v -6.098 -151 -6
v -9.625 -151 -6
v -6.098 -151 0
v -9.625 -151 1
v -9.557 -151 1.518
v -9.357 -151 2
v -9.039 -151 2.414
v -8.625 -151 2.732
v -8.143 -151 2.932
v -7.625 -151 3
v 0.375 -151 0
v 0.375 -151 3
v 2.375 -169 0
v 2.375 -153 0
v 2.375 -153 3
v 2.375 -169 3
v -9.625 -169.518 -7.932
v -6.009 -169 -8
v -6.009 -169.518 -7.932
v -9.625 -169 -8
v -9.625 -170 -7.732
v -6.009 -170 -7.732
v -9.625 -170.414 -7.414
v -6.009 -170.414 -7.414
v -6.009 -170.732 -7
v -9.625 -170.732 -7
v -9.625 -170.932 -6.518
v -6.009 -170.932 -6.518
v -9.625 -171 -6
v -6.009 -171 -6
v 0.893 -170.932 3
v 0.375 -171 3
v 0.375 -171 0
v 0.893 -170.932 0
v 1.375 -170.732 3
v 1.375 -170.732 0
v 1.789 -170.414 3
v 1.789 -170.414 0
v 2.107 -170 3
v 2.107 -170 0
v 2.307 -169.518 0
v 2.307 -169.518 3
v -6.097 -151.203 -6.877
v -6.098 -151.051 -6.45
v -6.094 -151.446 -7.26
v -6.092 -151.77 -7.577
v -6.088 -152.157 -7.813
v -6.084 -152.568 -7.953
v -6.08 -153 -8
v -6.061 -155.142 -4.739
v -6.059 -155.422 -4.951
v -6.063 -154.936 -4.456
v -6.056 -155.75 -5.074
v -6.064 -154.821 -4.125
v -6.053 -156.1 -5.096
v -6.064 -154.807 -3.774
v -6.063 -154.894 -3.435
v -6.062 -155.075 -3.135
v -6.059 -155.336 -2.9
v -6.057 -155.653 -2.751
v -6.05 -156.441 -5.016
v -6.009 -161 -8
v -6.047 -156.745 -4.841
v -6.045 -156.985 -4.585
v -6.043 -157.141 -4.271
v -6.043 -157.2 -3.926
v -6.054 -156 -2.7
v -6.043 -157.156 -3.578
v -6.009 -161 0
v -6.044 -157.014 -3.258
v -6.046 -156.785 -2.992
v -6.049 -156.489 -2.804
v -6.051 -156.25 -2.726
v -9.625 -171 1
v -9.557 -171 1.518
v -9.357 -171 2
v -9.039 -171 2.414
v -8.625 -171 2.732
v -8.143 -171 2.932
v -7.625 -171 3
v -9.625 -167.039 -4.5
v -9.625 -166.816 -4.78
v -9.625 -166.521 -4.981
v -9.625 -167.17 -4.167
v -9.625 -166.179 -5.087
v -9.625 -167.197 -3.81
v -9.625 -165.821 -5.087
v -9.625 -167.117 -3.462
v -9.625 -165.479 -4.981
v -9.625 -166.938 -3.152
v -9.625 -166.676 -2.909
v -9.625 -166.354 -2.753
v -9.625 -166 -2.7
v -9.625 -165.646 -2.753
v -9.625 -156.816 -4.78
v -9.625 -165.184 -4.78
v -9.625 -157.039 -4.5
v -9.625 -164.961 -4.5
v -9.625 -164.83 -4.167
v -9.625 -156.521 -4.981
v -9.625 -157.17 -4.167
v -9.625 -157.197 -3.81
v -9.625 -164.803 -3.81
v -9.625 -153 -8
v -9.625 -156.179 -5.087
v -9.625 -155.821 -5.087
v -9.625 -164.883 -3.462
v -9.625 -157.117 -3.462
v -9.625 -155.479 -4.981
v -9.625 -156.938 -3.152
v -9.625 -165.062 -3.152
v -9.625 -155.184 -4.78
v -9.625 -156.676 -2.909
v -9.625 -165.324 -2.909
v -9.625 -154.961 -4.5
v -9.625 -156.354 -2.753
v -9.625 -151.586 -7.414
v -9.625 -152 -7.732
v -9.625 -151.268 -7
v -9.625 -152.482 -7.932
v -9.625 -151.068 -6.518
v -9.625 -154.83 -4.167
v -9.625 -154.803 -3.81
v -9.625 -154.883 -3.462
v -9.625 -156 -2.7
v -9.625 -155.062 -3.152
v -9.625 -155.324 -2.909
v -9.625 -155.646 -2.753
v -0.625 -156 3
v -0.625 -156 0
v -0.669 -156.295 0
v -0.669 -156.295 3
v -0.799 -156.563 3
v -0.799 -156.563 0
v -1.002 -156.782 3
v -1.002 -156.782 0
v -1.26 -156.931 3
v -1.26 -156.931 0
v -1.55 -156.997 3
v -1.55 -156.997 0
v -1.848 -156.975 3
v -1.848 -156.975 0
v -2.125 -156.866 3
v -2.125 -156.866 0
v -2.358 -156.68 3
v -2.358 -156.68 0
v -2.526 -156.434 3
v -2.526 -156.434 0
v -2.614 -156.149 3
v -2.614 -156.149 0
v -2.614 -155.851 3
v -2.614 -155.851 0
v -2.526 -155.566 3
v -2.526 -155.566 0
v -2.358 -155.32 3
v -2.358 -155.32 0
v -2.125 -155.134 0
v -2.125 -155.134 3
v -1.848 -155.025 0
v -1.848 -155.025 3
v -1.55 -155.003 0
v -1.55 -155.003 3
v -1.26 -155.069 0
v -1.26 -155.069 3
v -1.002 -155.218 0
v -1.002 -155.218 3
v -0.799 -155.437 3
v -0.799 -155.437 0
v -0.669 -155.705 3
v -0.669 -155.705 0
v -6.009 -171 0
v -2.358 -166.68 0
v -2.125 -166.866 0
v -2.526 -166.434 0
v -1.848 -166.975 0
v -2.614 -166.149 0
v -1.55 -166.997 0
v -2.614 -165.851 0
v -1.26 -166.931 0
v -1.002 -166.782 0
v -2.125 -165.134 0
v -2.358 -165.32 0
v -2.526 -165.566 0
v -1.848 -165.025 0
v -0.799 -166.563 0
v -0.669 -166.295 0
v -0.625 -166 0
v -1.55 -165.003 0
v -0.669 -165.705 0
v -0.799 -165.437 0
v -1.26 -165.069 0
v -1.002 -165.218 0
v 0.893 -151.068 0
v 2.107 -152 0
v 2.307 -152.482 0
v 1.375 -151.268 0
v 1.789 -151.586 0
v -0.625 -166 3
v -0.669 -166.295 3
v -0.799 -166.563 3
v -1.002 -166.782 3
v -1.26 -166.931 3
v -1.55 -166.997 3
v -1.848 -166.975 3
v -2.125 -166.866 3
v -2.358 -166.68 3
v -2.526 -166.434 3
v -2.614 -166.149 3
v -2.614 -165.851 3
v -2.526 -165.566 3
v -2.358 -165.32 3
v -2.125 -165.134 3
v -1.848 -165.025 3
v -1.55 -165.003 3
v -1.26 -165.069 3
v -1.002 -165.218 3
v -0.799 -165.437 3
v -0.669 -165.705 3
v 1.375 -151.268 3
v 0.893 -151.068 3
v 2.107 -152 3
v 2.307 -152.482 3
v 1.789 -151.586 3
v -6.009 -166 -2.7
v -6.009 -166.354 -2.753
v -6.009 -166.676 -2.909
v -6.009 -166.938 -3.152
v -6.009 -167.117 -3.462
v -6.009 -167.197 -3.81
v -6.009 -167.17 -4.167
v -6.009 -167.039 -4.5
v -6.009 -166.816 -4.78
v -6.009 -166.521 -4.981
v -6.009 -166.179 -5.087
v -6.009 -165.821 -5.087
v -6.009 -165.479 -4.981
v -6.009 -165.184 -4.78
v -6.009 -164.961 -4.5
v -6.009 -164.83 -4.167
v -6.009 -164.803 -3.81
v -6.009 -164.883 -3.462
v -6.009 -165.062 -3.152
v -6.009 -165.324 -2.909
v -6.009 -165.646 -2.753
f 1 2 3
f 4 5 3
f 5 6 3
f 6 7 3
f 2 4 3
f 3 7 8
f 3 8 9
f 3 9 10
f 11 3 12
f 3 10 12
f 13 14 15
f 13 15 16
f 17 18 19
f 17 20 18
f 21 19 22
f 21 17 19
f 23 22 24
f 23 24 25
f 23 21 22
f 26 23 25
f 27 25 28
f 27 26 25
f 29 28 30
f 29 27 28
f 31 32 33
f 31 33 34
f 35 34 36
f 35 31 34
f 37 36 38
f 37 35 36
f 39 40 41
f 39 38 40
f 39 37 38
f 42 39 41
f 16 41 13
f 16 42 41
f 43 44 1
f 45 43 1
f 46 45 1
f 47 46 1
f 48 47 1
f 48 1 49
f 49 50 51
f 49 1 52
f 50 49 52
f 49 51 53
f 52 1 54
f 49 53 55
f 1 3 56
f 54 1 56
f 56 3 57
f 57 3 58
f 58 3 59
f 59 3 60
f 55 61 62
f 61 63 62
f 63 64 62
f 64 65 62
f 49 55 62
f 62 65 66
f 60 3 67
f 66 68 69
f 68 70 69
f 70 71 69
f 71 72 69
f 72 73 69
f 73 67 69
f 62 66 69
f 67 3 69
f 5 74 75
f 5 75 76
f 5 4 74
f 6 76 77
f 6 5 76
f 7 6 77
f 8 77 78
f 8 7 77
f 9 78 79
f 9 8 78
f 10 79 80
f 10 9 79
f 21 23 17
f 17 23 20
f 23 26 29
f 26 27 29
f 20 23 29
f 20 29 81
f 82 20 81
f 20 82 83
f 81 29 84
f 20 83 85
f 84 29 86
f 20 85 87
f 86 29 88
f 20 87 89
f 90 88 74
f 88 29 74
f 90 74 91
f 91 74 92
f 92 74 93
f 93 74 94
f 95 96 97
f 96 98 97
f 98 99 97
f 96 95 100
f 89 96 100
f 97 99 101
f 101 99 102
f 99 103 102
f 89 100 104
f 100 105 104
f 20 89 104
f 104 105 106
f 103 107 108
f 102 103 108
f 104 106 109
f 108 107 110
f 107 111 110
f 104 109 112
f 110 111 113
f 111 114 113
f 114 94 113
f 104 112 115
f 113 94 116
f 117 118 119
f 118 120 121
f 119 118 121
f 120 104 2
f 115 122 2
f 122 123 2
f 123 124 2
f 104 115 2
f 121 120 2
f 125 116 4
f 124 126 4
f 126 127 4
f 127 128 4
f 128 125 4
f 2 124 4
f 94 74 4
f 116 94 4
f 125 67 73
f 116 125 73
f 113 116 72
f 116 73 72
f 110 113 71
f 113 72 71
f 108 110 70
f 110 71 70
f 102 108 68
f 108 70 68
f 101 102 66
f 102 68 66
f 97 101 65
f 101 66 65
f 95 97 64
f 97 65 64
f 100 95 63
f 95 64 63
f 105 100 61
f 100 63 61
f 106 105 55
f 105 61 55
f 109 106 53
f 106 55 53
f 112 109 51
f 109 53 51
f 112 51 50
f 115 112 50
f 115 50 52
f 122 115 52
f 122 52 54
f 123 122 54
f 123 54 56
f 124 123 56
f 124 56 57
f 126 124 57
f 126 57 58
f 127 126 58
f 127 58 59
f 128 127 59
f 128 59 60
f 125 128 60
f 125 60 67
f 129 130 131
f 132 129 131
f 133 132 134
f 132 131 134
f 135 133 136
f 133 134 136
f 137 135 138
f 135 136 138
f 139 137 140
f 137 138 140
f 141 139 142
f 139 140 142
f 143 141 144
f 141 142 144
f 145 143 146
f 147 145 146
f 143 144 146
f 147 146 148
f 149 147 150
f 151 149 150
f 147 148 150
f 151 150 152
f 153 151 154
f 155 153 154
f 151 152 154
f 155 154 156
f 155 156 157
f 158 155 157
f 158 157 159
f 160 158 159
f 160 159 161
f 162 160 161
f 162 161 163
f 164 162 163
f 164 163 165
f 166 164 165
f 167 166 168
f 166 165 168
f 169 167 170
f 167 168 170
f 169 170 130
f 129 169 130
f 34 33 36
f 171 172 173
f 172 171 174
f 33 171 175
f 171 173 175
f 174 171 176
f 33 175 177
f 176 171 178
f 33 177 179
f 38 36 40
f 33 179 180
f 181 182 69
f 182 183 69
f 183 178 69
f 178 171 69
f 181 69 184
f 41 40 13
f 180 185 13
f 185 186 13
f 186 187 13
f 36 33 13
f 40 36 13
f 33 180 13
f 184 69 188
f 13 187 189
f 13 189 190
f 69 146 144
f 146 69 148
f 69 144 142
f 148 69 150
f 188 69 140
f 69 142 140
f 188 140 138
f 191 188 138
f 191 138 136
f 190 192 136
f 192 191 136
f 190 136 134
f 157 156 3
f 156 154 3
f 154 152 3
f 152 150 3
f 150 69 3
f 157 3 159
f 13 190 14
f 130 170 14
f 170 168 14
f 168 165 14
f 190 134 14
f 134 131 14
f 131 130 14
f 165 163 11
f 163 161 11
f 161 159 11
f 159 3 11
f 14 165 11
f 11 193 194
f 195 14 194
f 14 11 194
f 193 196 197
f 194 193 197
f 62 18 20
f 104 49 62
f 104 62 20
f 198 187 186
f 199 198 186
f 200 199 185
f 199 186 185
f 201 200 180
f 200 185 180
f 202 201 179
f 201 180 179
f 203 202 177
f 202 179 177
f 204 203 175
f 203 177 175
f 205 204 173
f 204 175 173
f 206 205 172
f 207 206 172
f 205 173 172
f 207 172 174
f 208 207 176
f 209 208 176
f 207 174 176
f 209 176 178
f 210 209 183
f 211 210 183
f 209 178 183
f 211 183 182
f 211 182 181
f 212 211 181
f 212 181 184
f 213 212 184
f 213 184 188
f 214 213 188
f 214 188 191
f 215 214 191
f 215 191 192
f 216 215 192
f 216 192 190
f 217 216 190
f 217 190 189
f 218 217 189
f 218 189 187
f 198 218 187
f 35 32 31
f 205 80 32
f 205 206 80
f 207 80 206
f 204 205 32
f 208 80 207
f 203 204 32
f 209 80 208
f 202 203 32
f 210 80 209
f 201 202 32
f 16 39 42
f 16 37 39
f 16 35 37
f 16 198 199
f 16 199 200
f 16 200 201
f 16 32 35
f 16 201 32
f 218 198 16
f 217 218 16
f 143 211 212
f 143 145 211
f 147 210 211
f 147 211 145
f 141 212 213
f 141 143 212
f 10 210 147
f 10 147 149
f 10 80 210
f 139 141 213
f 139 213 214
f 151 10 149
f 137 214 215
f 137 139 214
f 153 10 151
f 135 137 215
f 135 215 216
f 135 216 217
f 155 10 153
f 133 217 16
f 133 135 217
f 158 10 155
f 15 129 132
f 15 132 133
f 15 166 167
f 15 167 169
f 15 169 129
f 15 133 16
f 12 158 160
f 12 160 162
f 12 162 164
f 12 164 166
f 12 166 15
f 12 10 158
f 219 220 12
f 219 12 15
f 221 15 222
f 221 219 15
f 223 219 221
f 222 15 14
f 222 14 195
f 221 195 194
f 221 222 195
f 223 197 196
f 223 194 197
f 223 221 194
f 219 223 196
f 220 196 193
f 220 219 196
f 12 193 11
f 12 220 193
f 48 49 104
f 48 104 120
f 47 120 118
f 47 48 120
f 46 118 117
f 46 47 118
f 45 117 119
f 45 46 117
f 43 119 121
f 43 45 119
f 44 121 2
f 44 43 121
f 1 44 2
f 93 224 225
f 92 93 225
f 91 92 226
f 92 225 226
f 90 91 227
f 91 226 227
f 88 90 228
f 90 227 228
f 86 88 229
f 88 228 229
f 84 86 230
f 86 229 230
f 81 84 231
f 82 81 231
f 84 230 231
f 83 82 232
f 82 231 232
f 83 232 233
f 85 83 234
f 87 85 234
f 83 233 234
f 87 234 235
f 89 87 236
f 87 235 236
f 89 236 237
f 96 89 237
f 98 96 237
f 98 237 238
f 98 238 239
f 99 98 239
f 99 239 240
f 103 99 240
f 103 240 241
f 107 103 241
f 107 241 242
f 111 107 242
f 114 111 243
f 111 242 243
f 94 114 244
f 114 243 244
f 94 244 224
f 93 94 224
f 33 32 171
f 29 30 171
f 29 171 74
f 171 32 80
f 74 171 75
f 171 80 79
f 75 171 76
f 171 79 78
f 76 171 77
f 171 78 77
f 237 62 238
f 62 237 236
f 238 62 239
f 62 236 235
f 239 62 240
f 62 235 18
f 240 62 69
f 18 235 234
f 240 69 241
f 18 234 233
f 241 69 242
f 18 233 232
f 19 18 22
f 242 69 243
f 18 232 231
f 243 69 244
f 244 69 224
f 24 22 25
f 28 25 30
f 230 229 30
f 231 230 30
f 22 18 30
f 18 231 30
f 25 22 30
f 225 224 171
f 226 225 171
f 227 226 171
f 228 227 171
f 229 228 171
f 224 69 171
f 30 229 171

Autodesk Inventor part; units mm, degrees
ref_plane "YZ Plane" through (0, 0, 0) normal (1, 0, 0) x (0, 1, 0)
ref_plane "XZ Plane" through (0, 0, 0) normal (0, 1, 0) x (-1, 0, 0)
ref_plane "XY Plane" through (0, 0, 0) normal (0, 0, 1) x (1, 0, 0)
ref_plane "Plano de trabajo1" through (0, 0, 0) normal (0, 0, 1) x (1, 0, 0)
sketch "Boceto1" plane through (0, 0, 0) normal (0, 0, 1) x (1, 0, 0)
  circle A0 centre (108.375, -226.9) radius 1.5
  circle A1 centre (108.375, -327.280446) radius 1.5
  line L0 (58.475, -218.4) -> (58.475, -213.4)
  line L1 (58.475, -213.4) -> (80.675, -213.4)
  line L2 (80.675, -213.4) -> (80.675, -218.4)
  line L3 (58.475, -218.4) -> (80.675, -218.4)
  line L4 (99.475, -248.4) -> (104.475, -248.4)
  line L5 (104.475, -248.4) -> (104.475, -268.4)
  line L6 (104.475, -268.4) -> (99.475, -268.4)
  line L7 (99.475, -330.5) -> (99.475, -268.4)
  line L8 (99.475, -330.5) -> (44.375, -330.5)
  line L9 (44.375, -330.5) -> (44.375, -223.4)
  line L10 (99.475, -223.4) -> (44.375, -223.4)
  line L11 (99.475, -248.4) -> (99.475, -223.4)
  line L12 (98.375, -209.4) -> (88.675, -209.4)
  line L13 (88.675, -209.4) -> (88.675, -176)
  line L14 (88.675, -176) -> (197.375, -176)
  line L15 (197.375, -176) -> (197.375, -326)
  line L16 (197.375, -326) -> (112.375, -326)
  line L17 (112.375, -326) -> (112.375, -223.4)
  arc A2 (112.375, -223.4) -> (98.375, -209.4) centre (98.375, -223.4) ccw
  line L18 (29.999359, -209.4) -> (29.999359, -326)
  line L19 (29.999359, -326) -> (20.625, -326)
  line L20 (20.625, -326) -> (20.625, -288)
  line L21 (20.625, -288) -> (9.375, -288)
  line L22 (9.375, -288) -> (9.375, -176)
  line L23 (9.375, -176) -> (20.625, -176)
  line L24 (20.625, -176) -> (20.625, -209.4)
  line L25 (20.625, -209.4) -> (29.999359, -209.4)
  circle A3 centre (69.375, -196) radius 1.6
  circle A4 centre (44.375, -196) radius 1.6
  circle A5 centre (215.275, -317.3) radius 1.5
  circle A6 centre (2.725, -309.3) radius 1.5
  circle A7 centre (2.725, -317.7) radius 1.5
  circle A8 centre (215.275, -311.6) radius 1.5
  line L26 (212.375, -161) -> (-5.625, -161)
  line L27 (-5.625, -161) -> (-5.625, -303)
  line L28 (-5.625, -303) -> (5.625, -303)
  line L29 (5.625, -303) -> (5.625, -306)
  line L30 (5.625, -306) -> (-1.875, -306)
  line L31 (-1.875, -306) -> (-1.875, -321)
  line L32 (-1.875, -321) -> (5.625, -321)
  line L33 (5.625, -321) -> (5.625, -341)
  line L34 (5.625, -341) -> (212.375, -341)
  line L35 (212.375, -341) -> (212.375, -321)
  line L36 (212.375, -321) -> (218.675, -321)
  line L37 (218.675, -321) -> (218.675, -307.9)
  line L38 (218.675, -307.9) -> (212.375, -307.9)
  line L39 (212.375, -307.9) -> (212.375, -161)
  circle A9 centre (143.025, -170) radius 1.5
  circle A10 centre (94.675, -170) radius 1.5
  circle A11 centre (191.375, -170) radius 1.5
  circle A12 centre (33.999359, -226.9) radius 1.5
  circle A13 centre (33.999359, -327.540446) radius 1.5
  circle A14 centre (143.025, -152) radius 1.5
  circle A15 centre (94.675, -152) radius 1.5
  circle A16 centre (191.375, -152) radius 1.5
  line L40 (-5.625, -161) -> (212.375, -161)
  line L41 (212.375, -161) -> (212.375, -14.1)
  line L42 (212.375, -14.1) -> (218.675, -14.1)
  line L43 (218.675, -14.1) -> (218.675, -1)
  line L44 (218.675, -1) -> (212.375, -1)
  line L45 (212.375, -1) -> (212.375, 19)
  line L46 (212.375, 19) -> (5.625, 19)
  line L47 (5.625, 19) -> (5.625, -1)
  line L48 (5.625, -1) -> (-1.875, -1)
  line L49 (-1.875, -1) -> (-1.875, -16)
  line L50 (-1.875, -16) -> (5.625, -16)
  line L51 (5.625, -16) -> (5.625, -19)
  line L52 (5.625, -19) -> (-5.625, -19)
  line L53 (-5.625, -19) -> (-5.625, -161)
  circle A17 centre (215.275, -4.7) radius 1.5
  circle A18 centre (2.725, -12.7) radius 1.5
  circle A19 centre (2.725, -4.3) radius 1.5
  circle A20 centre (215.275, -10.4) radius 1.5
  line L54 (91.875, 14.8) -> (91.875, -3.3)
  line L55 (91.875, -3.3) -> (83.875, -3.3)
  line L56 (83.875, -3.3) -> (83.875, 14.8)
  line L57 (83.875, 14.8) -> (91.875, 14.8)
  line L58 (163.175, 8.8) -> (163.175, 2.3)
  line L59 (163.175, 2.3) -> (156.675, 2.3)
  line L60 (156.675, 2.3) -> (156.675, 8.8)
  line L61 (156.675, 8.8) -> (163.175, 8.8)
  line L62 (145.075, 8.8) -> (145.075, 2.3)
  line L63 (145.075, 2.3) -> (138.575, 2.3)
  line L64 (138.575, 2.3) -> (138.575, 8.8)
  line L65 (138.575, 8.8) -> (145.075, 8.8)
  line L66 (102.375, 2.3) -> (102.375, 8.8)
  line L67 (102.375, 8.8) -> (108.875, 8.8)
  line L68 (108.875, 8.8) -> (108.875, 2.3)
  line L69 (108.875, 2.3) -> (102.375, 2.3)
  line L70 (184.675, 8.8) -> (184.675, 2.3)
  line L71 (184.675, 2.3) -> (178.175, 2.3)
  line L72 (178.175, 2.3) -> (178.175, 8.8)
  line L73 (178.175, 8.8) -> (184.675, 8.8)
  line L74 (126.975, 8.8) -> (126.975, 2.3)
  line L75 (126.975, 2.3) -> (120.475, 2.3)
  line L76 (120.475, 2.3) -> (120.475, 8.8)
  line L77 (120.475, 8.8) -> (126.975, 8.8)
  circle A21 centre (44.375, -126) radius 1.6
  circle A22 centre (69.375, -126) radius 1.6
  line L78 (20.625, -146) -> (9.375, -146)
  line L79 (9.375, -146) -> (9.375, -34)
  line L80 (9.375, -34) -> (20.625, -34)
  line L81 (20.625, -34) -> (20.625, 4)
  line L82 (20.625, 4) -> (49.475, 4)
  line L83 (49.475, 4) -> (49.475, -112.6)
  line L84 (49.475, -112.6) -> (20.625, -112.6)
  line L85 (20.625, -112.6) -> (20.625, -146)
  line L86 (88.675, -146) -> (88.675, -10.3)
  line L87 (88.675, -10.3) -> (197.375, -10.3)
  line L88 (197.375, -10.3) -> (197.375, -146)
  line L89 (197.375, -146) -> (88.675, -146)
  line L90 (220.675, 19) -> (220.675, -161)
  line L91 (-7.625, 19) -> (-7.625, -161)
  line L92 (212.875, -14.6) -> (212.875, -161)
  line L93 (-6.125, -161) -> (-6.125, -18.5)
  line L94 (-7.625, -161) -> (2.375, -161)
  line L95 (2.375, -161) -> (2.375, -171)
  line L96 (2.375, -171) -> (-9.625, -171)
  line L97 (-9.625, -171) -> (-9.625, -151)
  line L98 (-9.625, -151) -> (2.375, -151)
  line L99 (2.375, -151) -> (2.375, -171)
  line L100 (2.375, -151) -> (-1.625, -151)
  line L101 (-1.625, -151) -> (-1.625, -171)
  line L102 (2.375, -151) -> (2.375, -156)
  line L103 (2.375, -156) -> (-1.625, -156)
  line L104 (2.375, -171) -> (2.375, -166)
  line L105 (2.375, -166) -> (-1.625, -166)
  circle A23 centre (-1.625, -156) radius 1
  circle A24 centre (-1.625, -166) radius 1
  line L106 (-7.625, -161) -> (-6.125, -161)
  line L107 (-6.125, -18.5) -> (5.125, -18.5)
  line L108 (5.125, -18.5) -> (5.125, -16.5)
  line L109 (5.125, -16.5) -> (-2.375, -16.5)
  line L110 (-2.375, -16.5) -> (-2.375, -0.5)
  line L111 (-2.375, -0.5) -> (5.125, -0.5)
  line L112 (5.125, -0.5) -> (5.125, 19.5)
  line L113 (5.125, 19.5) -> (212.875, 19.5)
  line L114 (212.875, 19.5) -> (212.875, -0.5)
  line L115 (212.875, -0.5) -> (219.175, -0.5)
  line L116 (219.175, -0.5) -> (219.175, -14.6)
  line L117 (219.175, -14.6) -> (212.875, -14.6)
  line L118 (212.875, -161) -> (220.675, -161)
  arc A25 (220.675, 19) -> (218.675, 21) centre (218.675, 19) ccw
  line L119 (218.675, 21) -> (-5.625, 21)
  arc A26 (-5.625, 21) -> (-7.625, 19) centre (-5.625, 19) ccw
  circle A27 centre (216.675, -156) radius 1.5
  point P0 (0, 0)
  dimension "d0" = 10
  dimension "d1" = 10
  dimension "d2" = 12
  dimension "d3" = 20
  dimension "d4" = 4
  dimension "d5" = 5
  dimension "d6" = 5
  dimension "d7" = 2
  dimension "d8" = 2
extrude "Extrusión1" add sketch "Boceto1" along normal blind 3 contours L95 L105 A24 L101 L26 | L26 L101 A23 L103 L99 | L101 A24 L96 L27 L26 | L26 L53 L98 L101 A23 | L95 L96 L101 A24 L105 | L103 A23 L101 L98 L99 | L94 L93 L98 L53 | L27 L96 L97 L98 L91 L94 | L94 L91 L98 L93
sketch "Boceto2" plane through (0, 0, 0) normal (0, 0, -1) x (-1, 0, 0)
  line L0 (7.625, 19) -> (7.625, -161)
  line L1 (-2.375, -151) -> (9.625, -151)
  line L2 (-2.375, -171) -> (-2.375, -151)
  line L3 (9.625, -171) -> (-2.375, -171)
  line L4 (9.625, -151) -> (9.625, -171)
  circle A0 centre (1.625, -166) radius 1
  circle A1 centre (1.625, -156) radius 1
  line L5 (-14.191374, -161) -> (6.008626, -161)
  line L6 (7.625, 19) -> (7.625, -161)
  arc A2 (7.625, 19) -> (5.625, 21) centre (5.625, 19) ccw
  line L7 (5.625, 21) -> (-218.675, 21)
  arc A3 (-218.675, 21) -> (-220.675, 19) centre (-218.675, 19) ccw
  line L8 (-220.675, 19) -> (-220.675, -161)
  line L9 (-222.291374, -161) -> (-209.991374, -161)
  line L10 (-208.375, -161) -> (-208.375, 9.8)
  line L11 (-208.375, 9.8) -> (-12.575, 9.8)
  line L12 (-12.575, 9.8) -> (-12.575, -161)
  circle A4 centre (-215.275, -4.7) radius 1.2
  circle A5 centre (-2.725, -4.3) radius 1.2
  circle A6 centre (-2.725, -12.7) radius 1.2
  circle A7 centre (-215.275, -10.4) radius 1.2
  line L13 (6.008626, -161) -> (-14.191374, -161)
  line L14 (-14.191374, -161) -> (-14.191374, -337)
  line L15 (-14.191374, -337) -> (-209.991374, -337)
  line L16 (-209.991374, -337) -> (-209.991374, -161)
  line L17 (-209.991374, -161) -> (-222.291374, -161)
  line L18 (-222.291374, -161) -> (-222.291374, -346.2)
  arc A8 (-222.291374, -346.2) -> (-220.291374, -348.2) centre (-220.291374, -346.2) ccw
  line L19 (4.008626, -348.2) -> (-220.291374, -348.2)
  arc A9 (4.008626, -348.2) -> (6.008626, -346.2) centre (4.008626, -346.2) ccw
  line L20 (6.008626, -161) -> (6.008626, -346.2)
  circle A10 centre (-216.891374, -311.6) radius 1.2
  circle A11 centre (-4.341374, -309.3) radius 1.2
  circle A12 centre (-4.341374, -317.7) radius 1.2
  circle A13 centre (-216.891374, -317.3) radius 1.2
  line L21 (-2.375, -151) -> (9.625, -151)
  line L22 (9.625, -151) -> (9.625, -171)
  line L23 (9.625, -171) -> (-2.375, -171)
  line L24 (-2.375, -171) -> (-2.375, -151)
  circle A14 centre (1.625, -166) radius 1
  circle A15 centre (1.625, -156) radius 1
  point P0 (0, 0)
  point P1 (6.098425, -151)
  point P2 (7.625, -171)
  point P3 (6.008626, -171)
sketch "Boceto2 outline for Extrusión2" plane through (0, 0, 0) normal (0, 0, -1) x (-1, 0, 0)
  line L0 (6.008626, -161) -> (6.008626, -171)
  line L1 (6.098425, -151) -> (6.008626, -161)
  line L2 (9.625, -151) -> (6.098425, -151)
  line L3 (9.625, -171) -> (9.625, -151)
  line L4 (6.008626, -171) -> (9.625, -171)
extrude "Extrusión2" add sketch "Boceto2 outline for Extrusión2" along normal blind 8
fillet "Empalme1" radius 2 1 edges at (-9.625, -161, 3)
sketch "Boceto4" plane through (-9.625, -171, -8) normal (-1, 0, 0) x (0, 0, 1)
  line L0 (9, 20) -> (9, 0) projected
  line L1 (0, 20) -> (9, 20) projected
  line L2 (0, 0) -> (0, 20) projected
  line L3 (0, 0) -> (9, 0) projected
  line L4 (4.1, 262) -> (4.1, -242)
  line L5 (4.1, 20) -> (4.1, 15)
  circle A0 centre (4.1, 15) radius 1
  line L6 (8, 0) -> (0, 0) projected
  line L7 (4.1, 0) -> (4.1, 5)
  circle A1 centre (4.1, 5) radius 1
  point P0 (8, 171)
  dimension "d14" = 5
  dimension "d15" = 2
  dimension "d16" = 5
  dimension "d17" = 2
hole "Agujero1" at (-9.625, -166, -3.9) at (-9.625, -156, -3.9) direction (1, 0, 0) diameter 2.4 end through all
fillet "Empalme2" radius 2 4 edges at (-7.8617, -151, -8) (-7.8168, -171, -8) (2.375, -151, 1.5) (2.375, -171, 1.5)
properties part number "Union abajo"
